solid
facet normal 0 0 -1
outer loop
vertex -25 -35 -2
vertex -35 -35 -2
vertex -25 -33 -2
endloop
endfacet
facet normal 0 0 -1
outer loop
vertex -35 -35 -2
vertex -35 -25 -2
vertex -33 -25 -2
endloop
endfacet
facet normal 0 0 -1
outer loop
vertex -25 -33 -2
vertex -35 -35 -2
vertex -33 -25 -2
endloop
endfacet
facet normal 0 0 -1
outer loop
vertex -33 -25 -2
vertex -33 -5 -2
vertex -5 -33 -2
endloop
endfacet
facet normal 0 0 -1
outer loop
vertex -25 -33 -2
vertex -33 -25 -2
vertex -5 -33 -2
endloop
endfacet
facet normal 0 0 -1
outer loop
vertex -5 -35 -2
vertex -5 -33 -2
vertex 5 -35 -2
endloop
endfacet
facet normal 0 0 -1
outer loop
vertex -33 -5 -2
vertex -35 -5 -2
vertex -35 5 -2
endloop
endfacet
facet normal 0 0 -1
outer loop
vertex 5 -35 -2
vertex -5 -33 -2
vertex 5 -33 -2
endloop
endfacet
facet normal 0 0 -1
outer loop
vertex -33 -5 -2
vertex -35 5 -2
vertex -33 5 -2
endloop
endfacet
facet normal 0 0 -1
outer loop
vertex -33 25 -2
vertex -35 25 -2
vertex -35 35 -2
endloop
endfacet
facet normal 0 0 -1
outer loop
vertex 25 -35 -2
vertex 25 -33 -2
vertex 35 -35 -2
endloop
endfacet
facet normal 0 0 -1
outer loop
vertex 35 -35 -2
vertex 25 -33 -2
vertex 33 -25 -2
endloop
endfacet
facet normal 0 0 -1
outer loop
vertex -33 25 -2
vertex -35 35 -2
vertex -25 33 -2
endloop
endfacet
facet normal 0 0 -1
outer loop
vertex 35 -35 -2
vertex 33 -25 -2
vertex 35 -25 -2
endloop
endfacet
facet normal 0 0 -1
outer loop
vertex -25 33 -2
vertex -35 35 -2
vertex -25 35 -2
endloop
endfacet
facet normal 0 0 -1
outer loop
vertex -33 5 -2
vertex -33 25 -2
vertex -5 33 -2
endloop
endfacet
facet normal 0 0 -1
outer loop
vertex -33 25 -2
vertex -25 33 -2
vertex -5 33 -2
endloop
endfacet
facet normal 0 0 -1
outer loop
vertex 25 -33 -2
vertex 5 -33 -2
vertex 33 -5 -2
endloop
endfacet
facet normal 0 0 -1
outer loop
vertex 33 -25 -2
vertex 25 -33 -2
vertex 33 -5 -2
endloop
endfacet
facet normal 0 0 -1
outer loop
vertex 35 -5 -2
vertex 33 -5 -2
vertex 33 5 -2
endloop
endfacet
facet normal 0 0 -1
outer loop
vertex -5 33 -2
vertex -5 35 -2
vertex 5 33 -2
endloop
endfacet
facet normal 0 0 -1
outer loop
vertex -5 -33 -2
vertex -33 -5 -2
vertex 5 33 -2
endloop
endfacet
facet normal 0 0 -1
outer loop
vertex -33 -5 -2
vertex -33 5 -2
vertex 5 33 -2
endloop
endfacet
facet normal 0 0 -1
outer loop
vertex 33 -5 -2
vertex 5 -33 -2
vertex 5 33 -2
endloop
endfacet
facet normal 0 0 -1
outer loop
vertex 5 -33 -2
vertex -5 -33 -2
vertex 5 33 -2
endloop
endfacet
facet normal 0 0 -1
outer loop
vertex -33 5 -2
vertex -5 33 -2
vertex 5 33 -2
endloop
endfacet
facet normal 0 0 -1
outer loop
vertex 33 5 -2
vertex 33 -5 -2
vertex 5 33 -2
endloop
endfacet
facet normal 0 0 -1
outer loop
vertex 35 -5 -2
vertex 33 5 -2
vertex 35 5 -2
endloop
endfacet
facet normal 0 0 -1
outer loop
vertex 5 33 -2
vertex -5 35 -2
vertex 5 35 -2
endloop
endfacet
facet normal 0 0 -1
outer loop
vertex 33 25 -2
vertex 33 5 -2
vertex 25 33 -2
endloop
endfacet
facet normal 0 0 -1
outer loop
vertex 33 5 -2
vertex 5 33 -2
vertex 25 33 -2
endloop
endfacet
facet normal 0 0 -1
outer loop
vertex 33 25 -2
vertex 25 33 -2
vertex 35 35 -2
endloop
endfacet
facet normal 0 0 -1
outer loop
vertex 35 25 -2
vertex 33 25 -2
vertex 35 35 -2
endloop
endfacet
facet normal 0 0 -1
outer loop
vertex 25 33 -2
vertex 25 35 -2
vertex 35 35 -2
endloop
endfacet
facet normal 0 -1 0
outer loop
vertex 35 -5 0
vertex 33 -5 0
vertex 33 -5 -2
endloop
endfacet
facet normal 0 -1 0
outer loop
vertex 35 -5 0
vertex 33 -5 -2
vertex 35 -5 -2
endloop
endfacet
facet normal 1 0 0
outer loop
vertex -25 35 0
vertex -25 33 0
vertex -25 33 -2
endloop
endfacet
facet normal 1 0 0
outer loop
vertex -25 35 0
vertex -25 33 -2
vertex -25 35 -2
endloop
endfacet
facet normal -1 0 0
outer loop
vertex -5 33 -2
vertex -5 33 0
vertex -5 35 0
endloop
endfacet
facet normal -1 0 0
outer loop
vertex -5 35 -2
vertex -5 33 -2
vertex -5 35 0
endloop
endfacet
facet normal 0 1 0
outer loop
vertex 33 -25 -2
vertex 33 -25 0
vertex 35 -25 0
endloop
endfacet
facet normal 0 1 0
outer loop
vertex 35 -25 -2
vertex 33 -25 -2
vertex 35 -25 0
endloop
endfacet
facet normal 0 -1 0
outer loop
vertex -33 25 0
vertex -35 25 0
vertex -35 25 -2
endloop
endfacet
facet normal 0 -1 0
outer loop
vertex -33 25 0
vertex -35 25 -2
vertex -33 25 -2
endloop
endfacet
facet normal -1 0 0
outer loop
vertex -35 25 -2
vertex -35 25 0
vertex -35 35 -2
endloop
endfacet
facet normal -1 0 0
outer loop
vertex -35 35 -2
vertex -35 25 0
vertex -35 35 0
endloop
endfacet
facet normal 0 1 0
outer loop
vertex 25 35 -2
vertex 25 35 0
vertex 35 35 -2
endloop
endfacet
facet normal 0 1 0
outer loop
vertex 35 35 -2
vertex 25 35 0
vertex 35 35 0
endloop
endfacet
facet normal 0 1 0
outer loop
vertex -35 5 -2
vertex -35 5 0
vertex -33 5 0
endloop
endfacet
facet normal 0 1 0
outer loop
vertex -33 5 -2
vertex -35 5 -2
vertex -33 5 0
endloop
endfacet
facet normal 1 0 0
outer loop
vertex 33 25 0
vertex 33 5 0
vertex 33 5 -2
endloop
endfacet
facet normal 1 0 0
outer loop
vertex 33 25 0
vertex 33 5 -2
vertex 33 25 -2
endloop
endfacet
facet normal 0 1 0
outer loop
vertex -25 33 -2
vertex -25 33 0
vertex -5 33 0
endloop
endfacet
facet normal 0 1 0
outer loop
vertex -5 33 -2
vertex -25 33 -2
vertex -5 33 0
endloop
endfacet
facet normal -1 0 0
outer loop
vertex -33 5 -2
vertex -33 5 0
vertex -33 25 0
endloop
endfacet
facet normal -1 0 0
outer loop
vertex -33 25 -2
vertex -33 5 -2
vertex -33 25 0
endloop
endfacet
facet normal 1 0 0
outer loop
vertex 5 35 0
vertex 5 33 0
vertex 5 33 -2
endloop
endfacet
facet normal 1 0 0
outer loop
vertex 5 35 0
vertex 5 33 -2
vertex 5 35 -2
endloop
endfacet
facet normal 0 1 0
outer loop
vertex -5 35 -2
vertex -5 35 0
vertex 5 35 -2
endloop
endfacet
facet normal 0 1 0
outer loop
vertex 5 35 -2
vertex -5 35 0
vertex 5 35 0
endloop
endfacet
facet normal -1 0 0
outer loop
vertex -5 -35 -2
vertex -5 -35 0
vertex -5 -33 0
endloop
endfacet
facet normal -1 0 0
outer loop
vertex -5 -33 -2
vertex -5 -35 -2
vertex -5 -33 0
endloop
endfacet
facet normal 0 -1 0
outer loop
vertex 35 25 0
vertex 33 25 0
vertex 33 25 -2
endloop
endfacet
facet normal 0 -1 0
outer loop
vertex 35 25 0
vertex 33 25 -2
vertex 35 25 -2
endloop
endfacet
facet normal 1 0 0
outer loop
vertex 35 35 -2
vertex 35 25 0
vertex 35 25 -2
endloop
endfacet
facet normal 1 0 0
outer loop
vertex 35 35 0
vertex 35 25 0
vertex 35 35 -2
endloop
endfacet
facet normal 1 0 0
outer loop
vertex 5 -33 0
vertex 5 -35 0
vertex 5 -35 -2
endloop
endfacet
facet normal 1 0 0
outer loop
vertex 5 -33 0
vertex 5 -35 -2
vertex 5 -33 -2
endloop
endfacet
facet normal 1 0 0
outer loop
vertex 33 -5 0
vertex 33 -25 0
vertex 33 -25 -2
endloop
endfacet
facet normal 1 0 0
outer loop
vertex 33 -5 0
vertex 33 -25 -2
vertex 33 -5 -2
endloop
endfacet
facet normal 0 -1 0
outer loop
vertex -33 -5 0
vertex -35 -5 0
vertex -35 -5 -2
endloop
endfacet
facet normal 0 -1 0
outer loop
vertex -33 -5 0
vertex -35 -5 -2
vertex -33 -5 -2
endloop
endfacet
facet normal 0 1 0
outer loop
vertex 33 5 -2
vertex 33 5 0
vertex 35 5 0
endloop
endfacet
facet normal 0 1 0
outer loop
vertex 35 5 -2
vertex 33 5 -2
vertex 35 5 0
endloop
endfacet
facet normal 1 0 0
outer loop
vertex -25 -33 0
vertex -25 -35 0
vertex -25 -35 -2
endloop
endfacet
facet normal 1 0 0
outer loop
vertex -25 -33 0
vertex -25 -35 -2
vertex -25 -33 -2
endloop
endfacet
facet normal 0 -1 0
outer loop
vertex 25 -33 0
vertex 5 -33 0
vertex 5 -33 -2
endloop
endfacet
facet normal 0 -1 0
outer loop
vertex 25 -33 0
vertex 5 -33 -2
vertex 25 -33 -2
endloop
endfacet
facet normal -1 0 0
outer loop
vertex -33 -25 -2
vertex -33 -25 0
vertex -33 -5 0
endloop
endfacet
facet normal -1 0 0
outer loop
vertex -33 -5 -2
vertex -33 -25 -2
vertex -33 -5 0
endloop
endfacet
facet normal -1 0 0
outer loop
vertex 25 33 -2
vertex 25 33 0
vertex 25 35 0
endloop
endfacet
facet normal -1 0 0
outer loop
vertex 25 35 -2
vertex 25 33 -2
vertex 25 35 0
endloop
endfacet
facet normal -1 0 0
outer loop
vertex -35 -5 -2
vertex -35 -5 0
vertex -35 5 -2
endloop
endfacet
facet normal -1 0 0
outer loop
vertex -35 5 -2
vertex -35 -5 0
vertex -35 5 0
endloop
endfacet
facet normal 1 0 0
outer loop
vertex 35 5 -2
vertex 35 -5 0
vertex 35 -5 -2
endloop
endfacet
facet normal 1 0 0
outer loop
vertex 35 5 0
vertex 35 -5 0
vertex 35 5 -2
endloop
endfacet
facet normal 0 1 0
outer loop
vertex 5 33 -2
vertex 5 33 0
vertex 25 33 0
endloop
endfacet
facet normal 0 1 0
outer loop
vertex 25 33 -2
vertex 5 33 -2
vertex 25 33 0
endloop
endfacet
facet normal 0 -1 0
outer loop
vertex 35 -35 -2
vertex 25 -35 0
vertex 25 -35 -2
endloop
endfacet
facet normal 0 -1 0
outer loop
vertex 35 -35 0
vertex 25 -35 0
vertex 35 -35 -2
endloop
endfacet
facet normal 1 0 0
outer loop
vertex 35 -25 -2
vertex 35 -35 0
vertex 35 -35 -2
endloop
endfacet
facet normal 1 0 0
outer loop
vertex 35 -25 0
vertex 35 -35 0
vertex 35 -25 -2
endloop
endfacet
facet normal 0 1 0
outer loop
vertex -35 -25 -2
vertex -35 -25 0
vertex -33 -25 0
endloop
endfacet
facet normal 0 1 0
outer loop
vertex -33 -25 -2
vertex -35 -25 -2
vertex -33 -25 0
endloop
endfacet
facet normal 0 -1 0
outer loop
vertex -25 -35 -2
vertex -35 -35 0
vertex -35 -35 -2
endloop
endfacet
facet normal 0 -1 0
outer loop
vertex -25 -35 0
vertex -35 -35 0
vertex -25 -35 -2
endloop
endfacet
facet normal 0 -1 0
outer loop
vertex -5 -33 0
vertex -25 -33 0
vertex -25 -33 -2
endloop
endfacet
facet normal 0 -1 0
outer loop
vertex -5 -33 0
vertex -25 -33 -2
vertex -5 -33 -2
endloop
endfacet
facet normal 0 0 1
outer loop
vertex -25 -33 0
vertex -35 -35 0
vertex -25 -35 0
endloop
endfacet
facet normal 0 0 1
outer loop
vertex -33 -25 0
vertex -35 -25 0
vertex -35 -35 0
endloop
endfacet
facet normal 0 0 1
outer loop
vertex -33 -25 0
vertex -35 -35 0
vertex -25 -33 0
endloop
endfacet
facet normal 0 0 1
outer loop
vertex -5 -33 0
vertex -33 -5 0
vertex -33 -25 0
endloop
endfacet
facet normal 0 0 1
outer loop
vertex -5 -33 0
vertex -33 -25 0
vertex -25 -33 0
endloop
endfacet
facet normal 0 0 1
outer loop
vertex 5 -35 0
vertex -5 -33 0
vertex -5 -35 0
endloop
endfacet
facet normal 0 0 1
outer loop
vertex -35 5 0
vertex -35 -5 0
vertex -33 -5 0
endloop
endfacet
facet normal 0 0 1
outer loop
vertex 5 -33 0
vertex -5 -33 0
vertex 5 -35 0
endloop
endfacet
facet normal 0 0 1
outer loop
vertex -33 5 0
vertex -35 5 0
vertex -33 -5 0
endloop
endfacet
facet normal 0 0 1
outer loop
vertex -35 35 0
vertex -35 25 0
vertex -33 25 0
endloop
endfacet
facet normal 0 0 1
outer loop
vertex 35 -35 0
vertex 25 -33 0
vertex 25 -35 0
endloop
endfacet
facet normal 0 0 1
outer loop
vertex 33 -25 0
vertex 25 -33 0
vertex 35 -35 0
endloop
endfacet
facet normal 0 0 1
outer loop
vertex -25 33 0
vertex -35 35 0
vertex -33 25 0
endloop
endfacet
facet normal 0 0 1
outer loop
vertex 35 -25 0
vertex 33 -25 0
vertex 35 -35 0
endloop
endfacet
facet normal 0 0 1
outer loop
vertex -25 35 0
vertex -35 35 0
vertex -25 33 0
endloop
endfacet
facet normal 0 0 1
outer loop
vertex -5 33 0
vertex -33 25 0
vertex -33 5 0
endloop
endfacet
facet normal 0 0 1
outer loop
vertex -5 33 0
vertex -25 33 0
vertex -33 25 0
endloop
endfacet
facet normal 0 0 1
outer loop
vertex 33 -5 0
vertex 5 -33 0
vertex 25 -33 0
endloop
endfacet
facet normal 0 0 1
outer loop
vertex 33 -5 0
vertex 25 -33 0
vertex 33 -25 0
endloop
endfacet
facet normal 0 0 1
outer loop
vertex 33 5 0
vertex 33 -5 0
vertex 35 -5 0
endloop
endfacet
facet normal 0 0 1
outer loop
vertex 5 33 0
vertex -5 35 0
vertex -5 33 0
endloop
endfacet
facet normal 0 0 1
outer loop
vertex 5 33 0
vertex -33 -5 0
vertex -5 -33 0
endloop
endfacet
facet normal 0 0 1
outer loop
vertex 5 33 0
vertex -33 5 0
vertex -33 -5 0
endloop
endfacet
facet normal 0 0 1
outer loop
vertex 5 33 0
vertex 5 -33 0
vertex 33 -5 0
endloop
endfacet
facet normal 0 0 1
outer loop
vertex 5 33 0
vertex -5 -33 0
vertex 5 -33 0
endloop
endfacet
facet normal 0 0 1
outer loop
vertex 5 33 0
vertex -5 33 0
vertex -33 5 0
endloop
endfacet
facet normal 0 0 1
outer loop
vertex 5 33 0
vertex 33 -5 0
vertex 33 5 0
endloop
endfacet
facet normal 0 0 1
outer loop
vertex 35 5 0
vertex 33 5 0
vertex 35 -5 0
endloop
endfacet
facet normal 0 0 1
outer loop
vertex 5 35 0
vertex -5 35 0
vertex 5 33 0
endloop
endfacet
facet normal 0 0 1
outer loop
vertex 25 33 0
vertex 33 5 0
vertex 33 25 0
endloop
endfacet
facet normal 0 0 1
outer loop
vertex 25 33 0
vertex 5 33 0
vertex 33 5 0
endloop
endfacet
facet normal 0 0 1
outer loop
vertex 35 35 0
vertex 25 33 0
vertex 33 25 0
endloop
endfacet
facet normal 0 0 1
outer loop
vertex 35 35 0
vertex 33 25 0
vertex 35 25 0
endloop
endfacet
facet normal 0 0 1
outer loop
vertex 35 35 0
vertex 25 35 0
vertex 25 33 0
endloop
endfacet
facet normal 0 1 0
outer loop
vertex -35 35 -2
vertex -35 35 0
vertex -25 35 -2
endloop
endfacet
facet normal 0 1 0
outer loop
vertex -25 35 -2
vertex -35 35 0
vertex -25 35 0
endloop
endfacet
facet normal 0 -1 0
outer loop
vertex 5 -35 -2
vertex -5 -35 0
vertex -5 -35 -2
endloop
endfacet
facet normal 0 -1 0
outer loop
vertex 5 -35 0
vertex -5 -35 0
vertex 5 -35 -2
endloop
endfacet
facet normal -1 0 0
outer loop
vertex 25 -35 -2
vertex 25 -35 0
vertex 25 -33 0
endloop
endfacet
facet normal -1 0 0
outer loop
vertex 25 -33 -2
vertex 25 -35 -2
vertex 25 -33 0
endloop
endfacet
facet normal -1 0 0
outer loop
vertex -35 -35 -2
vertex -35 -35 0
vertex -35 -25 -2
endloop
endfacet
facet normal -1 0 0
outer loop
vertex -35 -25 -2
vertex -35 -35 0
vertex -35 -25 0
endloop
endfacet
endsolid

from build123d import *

# Parameters (mm, degrees)
SKETCH1_W           = 70
SKETCH1_H           = 70
BOSS_EXTRUDE1_DEPTH = 2
SKETCH2_W           = 2
SKETCH2_H           = 20
SKETCH2_W_2         = 20
SKETCH2_H_2         = 2
CUT_EXTRUDE1_DEPTH  = 2


with BuildPart() as part:
    # Sketch1 → Boss-Extrude1 (new body)
    with BuildSketch(Plane.XY):
        Rectangle(SKETCH1_W, SKETCH1_H)
    extrude(amount=-BOSS_EXTRUDE1_DEPTH)

    # Sketch2 → Cut-Extrude1 (cut)
    with BuildSketch(Plane.XY):
        with Locations((-34, 15)):
            Rectangle(SKETCH2_W, SKETCH2_H)
        with Locations((-34, -15)):
            Rectangle(SKETCH2_W, SKETCH2_H)
        with Locations((-15, -34)):
            Rectangle(SKETCH2_W_2, SKETCH2_H_2)
        with Locations((15, -34)):
            Rectangle(SKETCH2_W_2, SKETCH2_H_2)
        with Locations((34, -15)):
            Rectangle(SKETCH2_W, SKETCH2_H)
        with Locations((34, 15)):
            Rectangle(SKETCH2_W, SKETCH2_H)
        with Locations((15, 34)):
            Rectangle(SKETCH2_W_2, SKETCH2_H_2)
        with Locations((-15, 34)):
            Rectangle(SKETCH2_W_2, SKETCH2_H_2)
    extrude(amount=-CUT_EXTRUDE1_DEPTH, mode=Mode.SUBTRACT)


solid = part.part
